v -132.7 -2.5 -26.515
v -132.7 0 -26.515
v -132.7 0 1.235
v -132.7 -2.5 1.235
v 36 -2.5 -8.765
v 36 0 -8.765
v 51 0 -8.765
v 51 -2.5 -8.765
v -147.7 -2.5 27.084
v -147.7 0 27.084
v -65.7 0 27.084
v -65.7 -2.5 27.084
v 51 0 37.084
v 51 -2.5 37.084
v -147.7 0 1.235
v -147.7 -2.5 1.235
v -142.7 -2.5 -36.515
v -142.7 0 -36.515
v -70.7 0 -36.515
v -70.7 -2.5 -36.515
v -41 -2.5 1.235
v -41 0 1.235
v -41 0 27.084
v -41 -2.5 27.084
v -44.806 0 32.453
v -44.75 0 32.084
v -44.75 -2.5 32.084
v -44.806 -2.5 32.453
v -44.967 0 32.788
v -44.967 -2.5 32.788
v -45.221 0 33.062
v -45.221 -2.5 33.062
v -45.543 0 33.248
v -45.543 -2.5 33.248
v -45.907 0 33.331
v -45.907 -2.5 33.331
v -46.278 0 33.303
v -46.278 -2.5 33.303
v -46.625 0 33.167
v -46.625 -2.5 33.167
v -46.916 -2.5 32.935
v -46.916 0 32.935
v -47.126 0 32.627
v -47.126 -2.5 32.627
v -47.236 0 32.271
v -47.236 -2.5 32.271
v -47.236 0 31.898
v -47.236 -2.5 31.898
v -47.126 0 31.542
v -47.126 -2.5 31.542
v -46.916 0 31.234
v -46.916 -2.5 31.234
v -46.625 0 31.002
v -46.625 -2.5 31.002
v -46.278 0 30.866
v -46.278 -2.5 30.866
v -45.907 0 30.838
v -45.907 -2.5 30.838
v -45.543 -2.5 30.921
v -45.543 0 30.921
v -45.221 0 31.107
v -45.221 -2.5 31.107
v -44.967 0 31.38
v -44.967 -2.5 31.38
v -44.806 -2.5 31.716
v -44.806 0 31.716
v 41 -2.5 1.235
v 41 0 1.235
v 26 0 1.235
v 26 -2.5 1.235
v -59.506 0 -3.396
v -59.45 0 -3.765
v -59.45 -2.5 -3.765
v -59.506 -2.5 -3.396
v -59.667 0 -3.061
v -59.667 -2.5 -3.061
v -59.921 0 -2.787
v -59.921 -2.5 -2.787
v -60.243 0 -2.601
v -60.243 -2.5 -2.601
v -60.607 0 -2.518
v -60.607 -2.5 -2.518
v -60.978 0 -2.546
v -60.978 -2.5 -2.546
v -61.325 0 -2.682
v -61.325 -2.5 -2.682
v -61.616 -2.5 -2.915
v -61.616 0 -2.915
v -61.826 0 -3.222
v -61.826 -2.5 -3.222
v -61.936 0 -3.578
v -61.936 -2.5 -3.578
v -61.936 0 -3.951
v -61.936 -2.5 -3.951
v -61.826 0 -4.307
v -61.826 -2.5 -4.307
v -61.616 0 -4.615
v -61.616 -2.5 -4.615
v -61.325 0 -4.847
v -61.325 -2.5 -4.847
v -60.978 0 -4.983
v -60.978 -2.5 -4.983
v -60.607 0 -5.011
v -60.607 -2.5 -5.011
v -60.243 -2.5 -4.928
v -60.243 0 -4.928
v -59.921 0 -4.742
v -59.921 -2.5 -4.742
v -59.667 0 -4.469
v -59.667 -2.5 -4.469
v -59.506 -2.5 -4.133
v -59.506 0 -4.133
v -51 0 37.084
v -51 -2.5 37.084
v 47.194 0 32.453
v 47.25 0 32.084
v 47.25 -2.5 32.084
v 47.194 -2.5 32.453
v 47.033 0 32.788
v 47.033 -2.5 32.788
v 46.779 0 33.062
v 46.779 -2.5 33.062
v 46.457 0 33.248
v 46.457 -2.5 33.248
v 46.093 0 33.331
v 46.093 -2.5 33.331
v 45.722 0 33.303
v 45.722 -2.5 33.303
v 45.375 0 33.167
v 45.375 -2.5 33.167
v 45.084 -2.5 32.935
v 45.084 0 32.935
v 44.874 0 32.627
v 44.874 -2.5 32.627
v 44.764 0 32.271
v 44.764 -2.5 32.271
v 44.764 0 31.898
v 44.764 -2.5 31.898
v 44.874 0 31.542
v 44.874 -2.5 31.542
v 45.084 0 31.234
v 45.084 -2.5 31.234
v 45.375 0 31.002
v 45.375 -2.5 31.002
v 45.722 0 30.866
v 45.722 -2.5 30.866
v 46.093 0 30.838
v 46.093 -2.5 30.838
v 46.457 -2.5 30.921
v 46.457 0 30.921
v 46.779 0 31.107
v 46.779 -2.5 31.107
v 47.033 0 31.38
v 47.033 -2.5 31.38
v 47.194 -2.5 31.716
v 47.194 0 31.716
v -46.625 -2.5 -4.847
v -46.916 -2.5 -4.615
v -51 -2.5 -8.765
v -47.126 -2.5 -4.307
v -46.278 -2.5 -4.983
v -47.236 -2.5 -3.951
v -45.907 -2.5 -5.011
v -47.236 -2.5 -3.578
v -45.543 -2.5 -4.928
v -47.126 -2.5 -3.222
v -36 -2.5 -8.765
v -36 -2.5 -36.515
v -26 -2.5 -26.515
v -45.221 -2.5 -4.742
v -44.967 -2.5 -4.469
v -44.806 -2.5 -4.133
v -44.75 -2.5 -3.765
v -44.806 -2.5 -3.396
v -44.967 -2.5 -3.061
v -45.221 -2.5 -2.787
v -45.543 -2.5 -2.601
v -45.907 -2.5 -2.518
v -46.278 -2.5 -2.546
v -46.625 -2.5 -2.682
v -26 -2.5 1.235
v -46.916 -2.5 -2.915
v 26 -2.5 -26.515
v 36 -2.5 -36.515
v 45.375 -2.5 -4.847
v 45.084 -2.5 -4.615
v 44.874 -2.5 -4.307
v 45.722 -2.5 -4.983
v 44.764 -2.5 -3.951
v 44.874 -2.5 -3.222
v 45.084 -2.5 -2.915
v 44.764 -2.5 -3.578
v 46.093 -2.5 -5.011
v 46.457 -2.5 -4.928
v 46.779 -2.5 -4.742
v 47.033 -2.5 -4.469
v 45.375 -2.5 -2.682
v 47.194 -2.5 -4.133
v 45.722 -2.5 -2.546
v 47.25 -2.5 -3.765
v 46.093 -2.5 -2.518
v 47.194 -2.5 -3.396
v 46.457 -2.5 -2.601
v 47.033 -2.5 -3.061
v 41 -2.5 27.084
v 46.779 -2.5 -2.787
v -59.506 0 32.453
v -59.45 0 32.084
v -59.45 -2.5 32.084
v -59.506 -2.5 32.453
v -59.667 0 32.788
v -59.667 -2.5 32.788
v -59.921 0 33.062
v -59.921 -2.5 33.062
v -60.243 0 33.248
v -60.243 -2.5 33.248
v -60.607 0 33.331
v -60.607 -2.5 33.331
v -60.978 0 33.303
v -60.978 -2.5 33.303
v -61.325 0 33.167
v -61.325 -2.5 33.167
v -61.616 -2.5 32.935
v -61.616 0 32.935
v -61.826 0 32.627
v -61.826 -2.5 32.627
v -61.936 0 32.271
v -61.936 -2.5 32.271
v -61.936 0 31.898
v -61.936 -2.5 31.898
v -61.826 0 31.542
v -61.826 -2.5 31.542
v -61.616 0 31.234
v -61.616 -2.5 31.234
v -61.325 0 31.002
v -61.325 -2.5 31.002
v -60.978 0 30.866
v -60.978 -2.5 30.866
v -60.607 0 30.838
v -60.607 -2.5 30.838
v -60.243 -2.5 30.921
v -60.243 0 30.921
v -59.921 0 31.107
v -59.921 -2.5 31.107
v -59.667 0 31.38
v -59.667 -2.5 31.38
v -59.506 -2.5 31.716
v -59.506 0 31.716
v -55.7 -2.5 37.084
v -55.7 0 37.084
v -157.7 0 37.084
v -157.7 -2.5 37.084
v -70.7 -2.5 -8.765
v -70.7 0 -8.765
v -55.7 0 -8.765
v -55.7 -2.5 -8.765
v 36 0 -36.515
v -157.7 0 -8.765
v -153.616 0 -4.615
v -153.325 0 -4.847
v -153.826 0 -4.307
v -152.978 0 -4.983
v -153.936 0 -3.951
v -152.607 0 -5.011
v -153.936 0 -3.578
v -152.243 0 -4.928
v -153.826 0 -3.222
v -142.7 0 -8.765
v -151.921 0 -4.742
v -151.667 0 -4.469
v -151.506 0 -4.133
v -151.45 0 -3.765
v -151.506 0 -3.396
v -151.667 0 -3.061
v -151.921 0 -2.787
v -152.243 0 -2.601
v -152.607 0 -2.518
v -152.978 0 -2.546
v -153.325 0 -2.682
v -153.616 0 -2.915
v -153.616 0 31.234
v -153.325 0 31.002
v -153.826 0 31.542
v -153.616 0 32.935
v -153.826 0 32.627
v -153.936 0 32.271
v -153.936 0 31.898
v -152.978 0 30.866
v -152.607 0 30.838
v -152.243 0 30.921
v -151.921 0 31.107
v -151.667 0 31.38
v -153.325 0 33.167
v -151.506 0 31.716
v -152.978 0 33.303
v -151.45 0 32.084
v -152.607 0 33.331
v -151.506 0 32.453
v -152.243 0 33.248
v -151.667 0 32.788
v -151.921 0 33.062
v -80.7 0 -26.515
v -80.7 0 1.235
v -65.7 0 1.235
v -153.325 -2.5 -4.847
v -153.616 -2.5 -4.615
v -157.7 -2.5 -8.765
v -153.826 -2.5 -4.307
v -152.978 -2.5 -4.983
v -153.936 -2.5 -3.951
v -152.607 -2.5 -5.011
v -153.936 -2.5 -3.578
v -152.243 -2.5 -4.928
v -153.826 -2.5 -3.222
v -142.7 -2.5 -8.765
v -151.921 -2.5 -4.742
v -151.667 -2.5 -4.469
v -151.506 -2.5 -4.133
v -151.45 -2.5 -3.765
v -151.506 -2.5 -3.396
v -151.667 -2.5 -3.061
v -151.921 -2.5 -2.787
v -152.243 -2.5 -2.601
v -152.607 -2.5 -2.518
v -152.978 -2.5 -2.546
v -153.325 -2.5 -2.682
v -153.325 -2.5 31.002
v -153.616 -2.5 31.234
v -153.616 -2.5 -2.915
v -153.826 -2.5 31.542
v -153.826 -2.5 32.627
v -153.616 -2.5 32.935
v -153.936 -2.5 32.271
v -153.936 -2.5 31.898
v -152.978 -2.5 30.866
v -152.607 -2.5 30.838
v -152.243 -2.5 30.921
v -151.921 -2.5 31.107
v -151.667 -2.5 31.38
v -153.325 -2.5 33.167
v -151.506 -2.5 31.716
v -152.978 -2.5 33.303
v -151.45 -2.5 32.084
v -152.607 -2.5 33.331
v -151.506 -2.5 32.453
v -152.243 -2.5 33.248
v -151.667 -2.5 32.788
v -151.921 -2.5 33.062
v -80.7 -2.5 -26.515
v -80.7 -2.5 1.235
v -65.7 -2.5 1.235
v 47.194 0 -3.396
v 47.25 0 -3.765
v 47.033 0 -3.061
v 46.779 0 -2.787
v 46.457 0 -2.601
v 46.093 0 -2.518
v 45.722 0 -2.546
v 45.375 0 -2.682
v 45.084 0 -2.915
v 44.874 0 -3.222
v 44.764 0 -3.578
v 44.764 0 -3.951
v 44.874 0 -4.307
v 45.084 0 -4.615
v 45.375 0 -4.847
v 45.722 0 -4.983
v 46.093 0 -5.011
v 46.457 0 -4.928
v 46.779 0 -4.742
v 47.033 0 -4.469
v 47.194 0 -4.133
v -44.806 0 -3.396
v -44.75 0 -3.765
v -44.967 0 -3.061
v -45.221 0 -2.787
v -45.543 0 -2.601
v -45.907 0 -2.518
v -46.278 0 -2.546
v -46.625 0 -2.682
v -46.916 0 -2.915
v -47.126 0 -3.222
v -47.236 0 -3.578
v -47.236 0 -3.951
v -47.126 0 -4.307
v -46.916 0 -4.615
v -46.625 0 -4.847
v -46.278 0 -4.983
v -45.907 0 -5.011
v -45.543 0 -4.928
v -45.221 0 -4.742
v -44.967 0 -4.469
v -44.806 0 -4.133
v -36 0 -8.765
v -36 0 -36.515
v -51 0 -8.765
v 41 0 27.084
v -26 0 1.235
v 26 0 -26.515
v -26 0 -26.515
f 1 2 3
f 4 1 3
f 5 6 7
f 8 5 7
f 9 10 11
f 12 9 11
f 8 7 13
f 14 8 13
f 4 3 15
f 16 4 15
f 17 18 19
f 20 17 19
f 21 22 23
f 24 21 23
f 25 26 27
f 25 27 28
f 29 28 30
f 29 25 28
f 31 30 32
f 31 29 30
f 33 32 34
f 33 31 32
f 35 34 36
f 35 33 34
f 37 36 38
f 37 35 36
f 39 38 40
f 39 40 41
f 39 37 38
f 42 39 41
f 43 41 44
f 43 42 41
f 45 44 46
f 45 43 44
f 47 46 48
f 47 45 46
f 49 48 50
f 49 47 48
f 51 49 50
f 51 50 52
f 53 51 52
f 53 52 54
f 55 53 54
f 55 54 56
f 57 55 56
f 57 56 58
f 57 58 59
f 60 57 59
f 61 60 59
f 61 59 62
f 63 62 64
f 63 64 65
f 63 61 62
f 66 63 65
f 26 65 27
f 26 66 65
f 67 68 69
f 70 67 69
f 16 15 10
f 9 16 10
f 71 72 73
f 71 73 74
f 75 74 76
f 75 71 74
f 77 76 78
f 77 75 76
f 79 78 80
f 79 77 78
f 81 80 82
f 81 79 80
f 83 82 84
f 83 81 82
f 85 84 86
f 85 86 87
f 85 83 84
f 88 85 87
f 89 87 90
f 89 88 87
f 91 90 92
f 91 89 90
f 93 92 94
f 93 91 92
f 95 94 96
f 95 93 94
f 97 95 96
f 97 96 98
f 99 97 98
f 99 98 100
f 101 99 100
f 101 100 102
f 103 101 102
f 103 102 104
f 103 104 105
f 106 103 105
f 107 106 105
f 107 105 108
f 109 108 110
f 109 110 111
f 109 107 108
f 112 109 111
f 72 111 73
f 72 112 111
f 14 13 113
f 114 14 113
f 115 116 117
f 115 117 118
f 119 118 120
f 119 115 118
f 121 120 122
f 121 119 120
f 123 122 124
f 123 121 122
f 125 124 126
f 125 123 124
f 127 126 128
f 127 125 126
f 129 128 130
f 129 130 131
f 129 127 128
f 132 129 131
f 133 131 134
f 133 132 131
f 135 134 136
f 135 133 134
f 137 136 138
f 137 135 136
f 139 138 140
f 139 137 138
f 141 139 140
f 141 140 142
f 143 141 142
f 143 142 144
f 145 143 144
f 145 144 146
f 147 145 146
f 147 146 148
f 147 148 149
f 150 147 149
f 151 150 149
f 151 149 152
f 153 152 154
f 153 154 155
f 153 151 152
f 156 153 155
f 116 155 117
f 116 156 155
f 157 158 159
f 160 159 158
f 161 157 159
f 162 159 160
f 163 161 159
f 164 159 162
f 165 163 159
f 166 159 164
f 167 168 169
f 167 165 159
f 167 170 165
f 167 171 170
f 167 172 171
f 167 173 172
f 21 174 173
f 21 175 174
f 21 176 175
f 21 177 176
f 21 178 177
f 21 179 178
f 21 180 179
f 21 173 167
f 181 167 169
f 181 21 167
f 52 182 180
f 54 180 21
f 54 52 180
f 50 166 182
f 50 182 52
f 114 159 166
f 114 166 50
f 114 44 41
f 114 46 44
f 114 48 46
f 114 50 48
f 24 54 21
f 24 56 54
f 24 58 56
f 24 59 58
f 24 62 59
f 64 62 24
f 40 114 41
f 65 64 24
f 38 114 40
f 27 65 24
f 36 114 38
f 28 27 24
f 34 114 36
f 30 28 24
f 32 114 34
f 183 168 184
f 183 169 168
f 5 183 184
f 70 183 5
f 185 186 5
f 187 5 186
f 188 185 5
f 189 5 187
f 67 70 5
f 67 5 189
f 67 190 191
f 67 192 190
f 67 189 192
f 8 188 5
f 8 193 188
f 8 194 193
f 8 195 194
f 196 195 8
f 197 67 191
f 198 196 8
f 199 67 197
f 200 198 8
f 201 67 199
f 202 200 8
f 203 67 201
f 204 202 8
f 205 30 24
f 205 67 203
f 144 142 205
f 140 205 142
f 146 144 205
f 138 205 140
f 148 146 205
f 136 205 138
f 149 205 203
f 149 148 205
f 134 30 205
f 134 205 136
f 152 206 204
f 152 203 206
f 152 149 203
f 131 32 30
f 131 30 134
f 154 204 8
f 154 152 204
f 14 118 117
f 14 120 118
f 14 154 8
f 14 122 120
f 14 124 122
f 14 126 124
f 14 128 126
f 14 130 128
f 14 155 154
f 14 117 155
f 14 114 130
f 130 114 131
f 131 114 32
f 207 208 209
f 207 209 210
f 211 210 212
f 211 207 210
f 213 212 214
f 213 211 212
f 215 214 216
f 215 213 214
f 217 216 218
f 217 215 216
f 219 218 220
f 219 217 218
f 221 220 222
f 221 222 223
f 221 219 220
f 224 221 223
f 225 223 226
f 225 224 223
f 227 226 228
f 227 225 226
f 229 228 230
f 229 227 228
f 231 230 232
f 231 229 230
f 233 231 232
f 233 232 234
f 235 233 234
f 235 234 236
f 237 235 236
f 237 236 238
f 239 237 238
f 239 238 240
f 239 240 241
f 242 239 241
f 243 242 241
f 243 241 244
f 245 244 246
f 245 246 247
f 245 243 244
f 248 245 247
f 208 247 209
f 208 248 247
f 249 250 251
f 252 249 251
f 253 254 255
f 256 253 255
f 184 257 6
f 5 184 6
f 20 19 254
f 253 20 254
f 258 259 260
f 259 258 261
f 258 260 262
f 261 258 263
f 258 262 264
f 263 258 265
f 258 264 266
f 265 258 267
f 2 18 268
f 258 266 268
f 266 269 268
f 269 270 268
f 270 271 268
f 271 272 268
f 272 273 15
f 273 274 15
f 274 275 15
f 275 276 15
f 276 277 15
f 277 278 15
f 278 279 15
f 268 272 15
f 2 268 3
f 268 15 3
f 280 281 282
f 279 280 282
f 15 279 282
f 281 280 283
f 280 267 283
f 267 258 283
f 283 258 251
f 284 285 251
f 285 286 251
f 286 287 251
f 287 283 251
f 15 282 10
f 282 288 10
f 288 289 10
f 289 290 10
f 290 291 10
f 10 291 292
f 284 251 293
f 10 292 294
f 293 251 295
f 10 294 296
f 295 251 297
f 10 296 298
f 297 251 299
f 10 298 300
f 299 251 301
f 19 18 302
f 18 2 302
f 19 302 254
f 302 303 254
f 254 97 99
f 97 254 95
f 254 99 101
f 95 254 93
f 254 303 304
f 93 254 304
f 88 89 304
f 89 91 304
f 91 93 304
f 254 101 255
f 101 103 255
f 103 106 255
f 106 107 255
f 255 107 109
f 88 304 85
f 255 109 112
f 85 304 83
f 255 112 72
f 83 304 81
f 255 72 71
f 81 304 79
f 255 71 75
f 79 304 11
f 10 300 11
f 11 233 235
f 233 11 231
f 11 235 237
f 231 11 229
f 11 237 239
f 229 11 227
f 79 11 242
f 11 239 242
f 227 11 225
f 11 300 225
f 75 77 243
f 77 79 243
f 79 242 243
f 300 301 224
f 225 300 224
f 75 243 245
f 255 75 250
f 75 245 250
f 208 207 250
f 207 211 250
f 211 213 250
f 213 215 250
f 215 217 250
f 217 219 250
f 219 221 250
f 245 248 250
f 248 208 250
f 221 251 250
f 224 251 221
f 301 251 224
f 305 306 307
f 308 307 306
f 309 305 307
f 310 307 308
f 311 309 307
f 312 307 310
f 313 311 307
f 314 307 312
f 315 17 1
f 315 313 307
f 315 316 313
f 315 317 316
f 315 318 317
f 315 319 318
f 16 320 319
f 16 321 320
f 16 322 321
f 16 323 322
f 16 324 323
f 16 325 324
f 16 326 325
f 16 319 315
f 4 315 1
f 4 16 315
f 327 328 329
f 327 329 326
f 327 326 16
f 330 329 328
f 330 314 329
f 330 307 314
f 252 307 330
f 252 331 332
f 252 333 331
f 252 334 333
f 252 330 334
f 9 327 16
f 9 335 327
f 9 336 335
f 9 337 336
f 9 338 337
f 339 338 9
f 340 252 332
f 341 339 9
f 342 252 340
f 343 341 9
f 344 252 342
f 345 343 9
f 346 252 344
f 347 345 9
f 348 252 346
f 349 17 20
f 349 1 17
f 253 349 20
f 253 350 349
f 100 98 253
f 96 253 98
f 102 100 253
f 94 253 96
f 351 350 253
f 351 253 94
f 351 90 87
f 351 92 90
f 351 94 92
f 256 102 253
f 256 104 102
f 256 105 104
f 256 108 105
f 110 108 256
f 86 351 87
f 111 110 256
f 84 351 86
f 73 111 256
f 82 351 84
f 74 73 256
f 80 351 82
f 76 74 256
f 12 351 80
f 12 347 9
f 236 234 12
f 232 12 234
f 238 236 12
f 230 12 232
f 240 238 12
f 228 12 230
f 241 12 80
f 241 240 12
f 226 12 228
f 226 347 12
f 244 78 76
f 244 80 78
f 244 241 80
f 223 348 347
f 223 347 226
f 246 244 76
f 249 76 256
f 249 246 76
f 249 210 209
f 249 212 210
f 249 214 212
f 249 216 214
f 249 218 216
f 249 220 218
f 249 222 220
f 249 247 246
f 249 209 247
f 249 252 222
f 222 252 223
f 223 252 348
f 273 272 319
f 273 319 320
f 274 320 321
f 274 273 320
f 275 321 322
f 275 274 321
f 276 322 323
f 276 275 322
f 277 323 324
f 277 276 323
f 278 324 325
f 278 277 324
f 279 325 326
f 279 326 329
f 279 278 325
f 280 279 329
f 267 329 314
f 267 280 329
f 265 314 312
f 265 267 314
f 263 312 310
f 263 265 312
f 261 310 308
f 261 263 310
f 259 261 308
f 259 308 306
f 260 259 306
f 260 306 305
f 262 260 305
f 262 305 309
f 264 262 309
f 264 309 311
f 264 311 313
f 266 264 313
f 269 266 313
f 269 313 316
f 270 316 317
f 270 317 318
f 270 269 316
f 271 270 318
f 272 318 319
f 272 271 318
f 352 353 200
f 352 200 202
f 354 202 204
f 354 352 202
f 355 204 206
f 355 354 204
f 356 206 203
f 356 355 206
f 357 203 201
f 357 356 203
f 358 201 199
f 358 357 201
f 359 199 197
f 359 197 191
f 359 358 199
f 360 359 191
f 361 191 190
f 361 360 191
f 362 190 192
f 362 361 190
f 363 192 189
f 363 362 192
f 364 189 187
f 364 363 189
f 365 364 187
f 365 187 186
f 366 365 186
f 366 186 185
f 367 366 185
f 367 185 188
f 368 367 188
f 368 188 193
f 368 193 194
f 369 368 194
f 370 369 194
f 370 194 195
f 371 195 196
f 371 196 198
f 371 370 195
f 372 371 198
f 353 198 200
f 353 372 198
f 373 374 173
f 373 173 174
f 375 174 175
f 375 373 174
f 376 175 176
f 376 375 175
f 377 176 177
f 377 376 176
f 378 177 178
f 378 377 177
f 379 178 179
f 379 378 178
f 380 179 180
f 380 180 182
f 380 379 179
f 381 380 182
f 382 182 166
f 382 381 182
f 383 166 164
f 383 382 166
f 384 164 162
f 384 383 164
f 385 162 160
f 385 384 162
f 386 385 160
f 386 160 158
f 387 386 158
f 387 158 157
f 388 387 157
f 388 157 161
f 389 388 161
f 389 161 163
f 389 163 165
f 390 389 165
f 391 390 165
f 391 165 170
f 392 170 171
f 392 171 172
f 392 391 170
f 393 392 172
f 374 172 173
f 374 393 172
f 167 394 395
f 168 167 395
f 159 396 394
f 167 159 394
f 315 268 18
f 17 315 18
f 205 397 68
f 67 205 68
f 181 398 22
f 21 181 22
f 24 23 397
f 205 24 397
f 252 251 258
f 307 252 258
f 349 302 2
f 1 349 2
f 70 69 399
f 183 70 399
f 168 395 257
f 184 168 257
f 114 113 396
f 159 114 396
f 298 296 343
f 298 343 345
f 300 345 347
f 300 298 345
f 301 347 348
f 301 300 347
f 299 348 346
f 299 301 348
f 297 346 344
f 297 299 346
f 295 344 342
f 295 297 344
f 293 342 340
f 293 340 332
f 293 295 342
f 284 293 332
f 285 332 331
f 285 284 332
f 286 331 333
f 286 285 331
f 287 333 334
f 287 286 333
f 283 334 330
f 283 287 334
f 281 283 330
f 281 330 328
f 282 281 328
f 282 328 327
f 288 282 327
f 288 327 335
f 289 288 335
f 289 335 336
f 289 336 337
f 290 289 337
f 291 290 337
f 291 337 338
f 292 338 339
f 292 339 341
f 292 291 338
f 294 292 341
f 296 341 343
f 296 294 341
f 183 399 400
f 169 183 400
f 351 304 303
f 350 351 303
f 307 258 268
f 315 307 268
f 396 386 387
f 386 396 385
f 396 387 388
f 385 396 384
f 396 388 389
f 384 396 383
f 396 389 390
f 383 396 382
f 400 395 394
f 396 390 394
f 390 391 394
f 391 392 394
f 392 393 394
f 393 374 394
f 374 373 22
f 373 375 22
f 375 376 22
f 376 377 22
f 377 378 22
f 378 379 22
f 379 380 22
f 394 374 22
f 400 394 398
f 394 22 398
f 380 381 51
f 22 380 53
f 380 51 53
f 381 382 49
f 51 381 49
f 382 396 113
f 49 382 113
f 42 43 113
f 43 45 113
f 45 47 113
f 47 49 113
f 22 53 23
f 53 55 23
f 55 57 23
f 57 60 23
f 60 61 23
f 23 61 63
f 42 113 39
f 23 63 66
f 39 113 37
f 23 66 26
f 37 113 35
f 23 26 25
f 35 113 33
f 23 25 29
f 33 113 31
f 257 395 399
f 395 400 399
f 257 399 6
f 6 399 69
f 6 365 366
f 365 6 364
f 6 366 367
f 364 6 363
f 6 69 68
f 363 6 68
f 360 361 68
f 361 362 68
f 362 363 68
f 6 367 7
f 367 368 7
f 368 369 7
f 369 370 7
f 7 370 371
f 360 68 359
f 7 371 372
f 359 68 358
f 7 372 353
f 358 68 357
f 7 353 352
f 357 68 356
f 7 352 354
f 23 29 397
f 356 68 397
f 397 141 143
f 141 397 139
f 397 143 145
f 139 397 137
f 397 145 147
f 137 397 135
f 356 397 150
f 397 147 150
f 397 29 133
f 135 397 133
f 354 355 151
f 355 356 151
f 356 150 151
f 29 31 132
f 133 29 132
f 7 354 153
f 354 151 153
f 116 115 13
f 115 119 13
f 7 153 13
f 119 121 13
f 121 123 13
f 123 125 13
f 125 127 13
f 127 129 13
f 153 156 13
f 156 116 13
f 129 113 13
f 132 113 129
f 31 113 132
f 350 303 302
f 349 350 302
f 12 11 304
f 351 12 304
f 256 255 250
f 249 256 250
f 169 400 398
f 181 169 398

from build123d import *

# Parameters (mm, degrees)
F0_R     = 1.25
F1_DEPTH = 2.5


with BuildPart() as f1:
    # F0 (on Front) → F1 (new body)
    with BuildSketch(Plane.XZ):
        Polygon((-36, -8.764741), (-36, -36.514741), (36, -36.514741), (36, -8.764741), (51, -8.764741), (51, 37.084315), (-51, 37.084315), (-51, -8.764741), align=None)
        with Locations((-46, -3.764741)):
            Circle(F0_R, mode=Mode.SUBTRACT)
        Polygon((26, -26.514741), (-26, -26.514741), (-26, 1.235259), (-41, 1.235259), (-41, 27.084315), (41, 27.084315), (41, 1.235259), (26, 1.235259), align=None, mode=Mode.SUBTRACT)
        with Locations((46, -3.764741)):
            Circle(F0_R, mode=Mode.SUBTRACT)
        with Locations((-46, 32.084315)):
            Circle(F0_R, mode=Mode.SUBTRACT)
        with Locations((46, 32.084315)):
            Circle(F0_R, mode=Mode.SUBTRACT)
        Polygon((-157.7, -8.764741), (-142.7, -8.764741), (-142.7, -36.514741), (-70.7, -36.514741), (-70.7, -8.764741), (-55.7, -8.764741), (-55.7, 37.084315), (-157.7, 37.084315), align=None)
        with Locations((-152.7, -3.764741)):
            Circle(F0_R, mode=Mode.SUBTRACT)
        Polygon((-132.7, -26.514741), (-132.7, 1.235259), (-147.7, 1.235259), (-147.7, 27.084315), (-65.7, 27.084315), (-65.7, 1.235259), (-80.7, 1.235259), (-80.7, -26.514741), align=None, mode=Mode.SUBTRACT)
        with Locations((-60.7, -3.764741)):
            Circle(F0_R, mode=Mode.SUBTRACT)
        with Locations((-152.7, 32.084315)):
            Circle(F0_R, mode=Mode.SUBTRACT)
        with Locations((-60.7, 32.084315)):
            Circle(F0_R, mode=Mode.SUBTRACT)
    extrude(amount=F1_DEPTH)


solid = f1.part
